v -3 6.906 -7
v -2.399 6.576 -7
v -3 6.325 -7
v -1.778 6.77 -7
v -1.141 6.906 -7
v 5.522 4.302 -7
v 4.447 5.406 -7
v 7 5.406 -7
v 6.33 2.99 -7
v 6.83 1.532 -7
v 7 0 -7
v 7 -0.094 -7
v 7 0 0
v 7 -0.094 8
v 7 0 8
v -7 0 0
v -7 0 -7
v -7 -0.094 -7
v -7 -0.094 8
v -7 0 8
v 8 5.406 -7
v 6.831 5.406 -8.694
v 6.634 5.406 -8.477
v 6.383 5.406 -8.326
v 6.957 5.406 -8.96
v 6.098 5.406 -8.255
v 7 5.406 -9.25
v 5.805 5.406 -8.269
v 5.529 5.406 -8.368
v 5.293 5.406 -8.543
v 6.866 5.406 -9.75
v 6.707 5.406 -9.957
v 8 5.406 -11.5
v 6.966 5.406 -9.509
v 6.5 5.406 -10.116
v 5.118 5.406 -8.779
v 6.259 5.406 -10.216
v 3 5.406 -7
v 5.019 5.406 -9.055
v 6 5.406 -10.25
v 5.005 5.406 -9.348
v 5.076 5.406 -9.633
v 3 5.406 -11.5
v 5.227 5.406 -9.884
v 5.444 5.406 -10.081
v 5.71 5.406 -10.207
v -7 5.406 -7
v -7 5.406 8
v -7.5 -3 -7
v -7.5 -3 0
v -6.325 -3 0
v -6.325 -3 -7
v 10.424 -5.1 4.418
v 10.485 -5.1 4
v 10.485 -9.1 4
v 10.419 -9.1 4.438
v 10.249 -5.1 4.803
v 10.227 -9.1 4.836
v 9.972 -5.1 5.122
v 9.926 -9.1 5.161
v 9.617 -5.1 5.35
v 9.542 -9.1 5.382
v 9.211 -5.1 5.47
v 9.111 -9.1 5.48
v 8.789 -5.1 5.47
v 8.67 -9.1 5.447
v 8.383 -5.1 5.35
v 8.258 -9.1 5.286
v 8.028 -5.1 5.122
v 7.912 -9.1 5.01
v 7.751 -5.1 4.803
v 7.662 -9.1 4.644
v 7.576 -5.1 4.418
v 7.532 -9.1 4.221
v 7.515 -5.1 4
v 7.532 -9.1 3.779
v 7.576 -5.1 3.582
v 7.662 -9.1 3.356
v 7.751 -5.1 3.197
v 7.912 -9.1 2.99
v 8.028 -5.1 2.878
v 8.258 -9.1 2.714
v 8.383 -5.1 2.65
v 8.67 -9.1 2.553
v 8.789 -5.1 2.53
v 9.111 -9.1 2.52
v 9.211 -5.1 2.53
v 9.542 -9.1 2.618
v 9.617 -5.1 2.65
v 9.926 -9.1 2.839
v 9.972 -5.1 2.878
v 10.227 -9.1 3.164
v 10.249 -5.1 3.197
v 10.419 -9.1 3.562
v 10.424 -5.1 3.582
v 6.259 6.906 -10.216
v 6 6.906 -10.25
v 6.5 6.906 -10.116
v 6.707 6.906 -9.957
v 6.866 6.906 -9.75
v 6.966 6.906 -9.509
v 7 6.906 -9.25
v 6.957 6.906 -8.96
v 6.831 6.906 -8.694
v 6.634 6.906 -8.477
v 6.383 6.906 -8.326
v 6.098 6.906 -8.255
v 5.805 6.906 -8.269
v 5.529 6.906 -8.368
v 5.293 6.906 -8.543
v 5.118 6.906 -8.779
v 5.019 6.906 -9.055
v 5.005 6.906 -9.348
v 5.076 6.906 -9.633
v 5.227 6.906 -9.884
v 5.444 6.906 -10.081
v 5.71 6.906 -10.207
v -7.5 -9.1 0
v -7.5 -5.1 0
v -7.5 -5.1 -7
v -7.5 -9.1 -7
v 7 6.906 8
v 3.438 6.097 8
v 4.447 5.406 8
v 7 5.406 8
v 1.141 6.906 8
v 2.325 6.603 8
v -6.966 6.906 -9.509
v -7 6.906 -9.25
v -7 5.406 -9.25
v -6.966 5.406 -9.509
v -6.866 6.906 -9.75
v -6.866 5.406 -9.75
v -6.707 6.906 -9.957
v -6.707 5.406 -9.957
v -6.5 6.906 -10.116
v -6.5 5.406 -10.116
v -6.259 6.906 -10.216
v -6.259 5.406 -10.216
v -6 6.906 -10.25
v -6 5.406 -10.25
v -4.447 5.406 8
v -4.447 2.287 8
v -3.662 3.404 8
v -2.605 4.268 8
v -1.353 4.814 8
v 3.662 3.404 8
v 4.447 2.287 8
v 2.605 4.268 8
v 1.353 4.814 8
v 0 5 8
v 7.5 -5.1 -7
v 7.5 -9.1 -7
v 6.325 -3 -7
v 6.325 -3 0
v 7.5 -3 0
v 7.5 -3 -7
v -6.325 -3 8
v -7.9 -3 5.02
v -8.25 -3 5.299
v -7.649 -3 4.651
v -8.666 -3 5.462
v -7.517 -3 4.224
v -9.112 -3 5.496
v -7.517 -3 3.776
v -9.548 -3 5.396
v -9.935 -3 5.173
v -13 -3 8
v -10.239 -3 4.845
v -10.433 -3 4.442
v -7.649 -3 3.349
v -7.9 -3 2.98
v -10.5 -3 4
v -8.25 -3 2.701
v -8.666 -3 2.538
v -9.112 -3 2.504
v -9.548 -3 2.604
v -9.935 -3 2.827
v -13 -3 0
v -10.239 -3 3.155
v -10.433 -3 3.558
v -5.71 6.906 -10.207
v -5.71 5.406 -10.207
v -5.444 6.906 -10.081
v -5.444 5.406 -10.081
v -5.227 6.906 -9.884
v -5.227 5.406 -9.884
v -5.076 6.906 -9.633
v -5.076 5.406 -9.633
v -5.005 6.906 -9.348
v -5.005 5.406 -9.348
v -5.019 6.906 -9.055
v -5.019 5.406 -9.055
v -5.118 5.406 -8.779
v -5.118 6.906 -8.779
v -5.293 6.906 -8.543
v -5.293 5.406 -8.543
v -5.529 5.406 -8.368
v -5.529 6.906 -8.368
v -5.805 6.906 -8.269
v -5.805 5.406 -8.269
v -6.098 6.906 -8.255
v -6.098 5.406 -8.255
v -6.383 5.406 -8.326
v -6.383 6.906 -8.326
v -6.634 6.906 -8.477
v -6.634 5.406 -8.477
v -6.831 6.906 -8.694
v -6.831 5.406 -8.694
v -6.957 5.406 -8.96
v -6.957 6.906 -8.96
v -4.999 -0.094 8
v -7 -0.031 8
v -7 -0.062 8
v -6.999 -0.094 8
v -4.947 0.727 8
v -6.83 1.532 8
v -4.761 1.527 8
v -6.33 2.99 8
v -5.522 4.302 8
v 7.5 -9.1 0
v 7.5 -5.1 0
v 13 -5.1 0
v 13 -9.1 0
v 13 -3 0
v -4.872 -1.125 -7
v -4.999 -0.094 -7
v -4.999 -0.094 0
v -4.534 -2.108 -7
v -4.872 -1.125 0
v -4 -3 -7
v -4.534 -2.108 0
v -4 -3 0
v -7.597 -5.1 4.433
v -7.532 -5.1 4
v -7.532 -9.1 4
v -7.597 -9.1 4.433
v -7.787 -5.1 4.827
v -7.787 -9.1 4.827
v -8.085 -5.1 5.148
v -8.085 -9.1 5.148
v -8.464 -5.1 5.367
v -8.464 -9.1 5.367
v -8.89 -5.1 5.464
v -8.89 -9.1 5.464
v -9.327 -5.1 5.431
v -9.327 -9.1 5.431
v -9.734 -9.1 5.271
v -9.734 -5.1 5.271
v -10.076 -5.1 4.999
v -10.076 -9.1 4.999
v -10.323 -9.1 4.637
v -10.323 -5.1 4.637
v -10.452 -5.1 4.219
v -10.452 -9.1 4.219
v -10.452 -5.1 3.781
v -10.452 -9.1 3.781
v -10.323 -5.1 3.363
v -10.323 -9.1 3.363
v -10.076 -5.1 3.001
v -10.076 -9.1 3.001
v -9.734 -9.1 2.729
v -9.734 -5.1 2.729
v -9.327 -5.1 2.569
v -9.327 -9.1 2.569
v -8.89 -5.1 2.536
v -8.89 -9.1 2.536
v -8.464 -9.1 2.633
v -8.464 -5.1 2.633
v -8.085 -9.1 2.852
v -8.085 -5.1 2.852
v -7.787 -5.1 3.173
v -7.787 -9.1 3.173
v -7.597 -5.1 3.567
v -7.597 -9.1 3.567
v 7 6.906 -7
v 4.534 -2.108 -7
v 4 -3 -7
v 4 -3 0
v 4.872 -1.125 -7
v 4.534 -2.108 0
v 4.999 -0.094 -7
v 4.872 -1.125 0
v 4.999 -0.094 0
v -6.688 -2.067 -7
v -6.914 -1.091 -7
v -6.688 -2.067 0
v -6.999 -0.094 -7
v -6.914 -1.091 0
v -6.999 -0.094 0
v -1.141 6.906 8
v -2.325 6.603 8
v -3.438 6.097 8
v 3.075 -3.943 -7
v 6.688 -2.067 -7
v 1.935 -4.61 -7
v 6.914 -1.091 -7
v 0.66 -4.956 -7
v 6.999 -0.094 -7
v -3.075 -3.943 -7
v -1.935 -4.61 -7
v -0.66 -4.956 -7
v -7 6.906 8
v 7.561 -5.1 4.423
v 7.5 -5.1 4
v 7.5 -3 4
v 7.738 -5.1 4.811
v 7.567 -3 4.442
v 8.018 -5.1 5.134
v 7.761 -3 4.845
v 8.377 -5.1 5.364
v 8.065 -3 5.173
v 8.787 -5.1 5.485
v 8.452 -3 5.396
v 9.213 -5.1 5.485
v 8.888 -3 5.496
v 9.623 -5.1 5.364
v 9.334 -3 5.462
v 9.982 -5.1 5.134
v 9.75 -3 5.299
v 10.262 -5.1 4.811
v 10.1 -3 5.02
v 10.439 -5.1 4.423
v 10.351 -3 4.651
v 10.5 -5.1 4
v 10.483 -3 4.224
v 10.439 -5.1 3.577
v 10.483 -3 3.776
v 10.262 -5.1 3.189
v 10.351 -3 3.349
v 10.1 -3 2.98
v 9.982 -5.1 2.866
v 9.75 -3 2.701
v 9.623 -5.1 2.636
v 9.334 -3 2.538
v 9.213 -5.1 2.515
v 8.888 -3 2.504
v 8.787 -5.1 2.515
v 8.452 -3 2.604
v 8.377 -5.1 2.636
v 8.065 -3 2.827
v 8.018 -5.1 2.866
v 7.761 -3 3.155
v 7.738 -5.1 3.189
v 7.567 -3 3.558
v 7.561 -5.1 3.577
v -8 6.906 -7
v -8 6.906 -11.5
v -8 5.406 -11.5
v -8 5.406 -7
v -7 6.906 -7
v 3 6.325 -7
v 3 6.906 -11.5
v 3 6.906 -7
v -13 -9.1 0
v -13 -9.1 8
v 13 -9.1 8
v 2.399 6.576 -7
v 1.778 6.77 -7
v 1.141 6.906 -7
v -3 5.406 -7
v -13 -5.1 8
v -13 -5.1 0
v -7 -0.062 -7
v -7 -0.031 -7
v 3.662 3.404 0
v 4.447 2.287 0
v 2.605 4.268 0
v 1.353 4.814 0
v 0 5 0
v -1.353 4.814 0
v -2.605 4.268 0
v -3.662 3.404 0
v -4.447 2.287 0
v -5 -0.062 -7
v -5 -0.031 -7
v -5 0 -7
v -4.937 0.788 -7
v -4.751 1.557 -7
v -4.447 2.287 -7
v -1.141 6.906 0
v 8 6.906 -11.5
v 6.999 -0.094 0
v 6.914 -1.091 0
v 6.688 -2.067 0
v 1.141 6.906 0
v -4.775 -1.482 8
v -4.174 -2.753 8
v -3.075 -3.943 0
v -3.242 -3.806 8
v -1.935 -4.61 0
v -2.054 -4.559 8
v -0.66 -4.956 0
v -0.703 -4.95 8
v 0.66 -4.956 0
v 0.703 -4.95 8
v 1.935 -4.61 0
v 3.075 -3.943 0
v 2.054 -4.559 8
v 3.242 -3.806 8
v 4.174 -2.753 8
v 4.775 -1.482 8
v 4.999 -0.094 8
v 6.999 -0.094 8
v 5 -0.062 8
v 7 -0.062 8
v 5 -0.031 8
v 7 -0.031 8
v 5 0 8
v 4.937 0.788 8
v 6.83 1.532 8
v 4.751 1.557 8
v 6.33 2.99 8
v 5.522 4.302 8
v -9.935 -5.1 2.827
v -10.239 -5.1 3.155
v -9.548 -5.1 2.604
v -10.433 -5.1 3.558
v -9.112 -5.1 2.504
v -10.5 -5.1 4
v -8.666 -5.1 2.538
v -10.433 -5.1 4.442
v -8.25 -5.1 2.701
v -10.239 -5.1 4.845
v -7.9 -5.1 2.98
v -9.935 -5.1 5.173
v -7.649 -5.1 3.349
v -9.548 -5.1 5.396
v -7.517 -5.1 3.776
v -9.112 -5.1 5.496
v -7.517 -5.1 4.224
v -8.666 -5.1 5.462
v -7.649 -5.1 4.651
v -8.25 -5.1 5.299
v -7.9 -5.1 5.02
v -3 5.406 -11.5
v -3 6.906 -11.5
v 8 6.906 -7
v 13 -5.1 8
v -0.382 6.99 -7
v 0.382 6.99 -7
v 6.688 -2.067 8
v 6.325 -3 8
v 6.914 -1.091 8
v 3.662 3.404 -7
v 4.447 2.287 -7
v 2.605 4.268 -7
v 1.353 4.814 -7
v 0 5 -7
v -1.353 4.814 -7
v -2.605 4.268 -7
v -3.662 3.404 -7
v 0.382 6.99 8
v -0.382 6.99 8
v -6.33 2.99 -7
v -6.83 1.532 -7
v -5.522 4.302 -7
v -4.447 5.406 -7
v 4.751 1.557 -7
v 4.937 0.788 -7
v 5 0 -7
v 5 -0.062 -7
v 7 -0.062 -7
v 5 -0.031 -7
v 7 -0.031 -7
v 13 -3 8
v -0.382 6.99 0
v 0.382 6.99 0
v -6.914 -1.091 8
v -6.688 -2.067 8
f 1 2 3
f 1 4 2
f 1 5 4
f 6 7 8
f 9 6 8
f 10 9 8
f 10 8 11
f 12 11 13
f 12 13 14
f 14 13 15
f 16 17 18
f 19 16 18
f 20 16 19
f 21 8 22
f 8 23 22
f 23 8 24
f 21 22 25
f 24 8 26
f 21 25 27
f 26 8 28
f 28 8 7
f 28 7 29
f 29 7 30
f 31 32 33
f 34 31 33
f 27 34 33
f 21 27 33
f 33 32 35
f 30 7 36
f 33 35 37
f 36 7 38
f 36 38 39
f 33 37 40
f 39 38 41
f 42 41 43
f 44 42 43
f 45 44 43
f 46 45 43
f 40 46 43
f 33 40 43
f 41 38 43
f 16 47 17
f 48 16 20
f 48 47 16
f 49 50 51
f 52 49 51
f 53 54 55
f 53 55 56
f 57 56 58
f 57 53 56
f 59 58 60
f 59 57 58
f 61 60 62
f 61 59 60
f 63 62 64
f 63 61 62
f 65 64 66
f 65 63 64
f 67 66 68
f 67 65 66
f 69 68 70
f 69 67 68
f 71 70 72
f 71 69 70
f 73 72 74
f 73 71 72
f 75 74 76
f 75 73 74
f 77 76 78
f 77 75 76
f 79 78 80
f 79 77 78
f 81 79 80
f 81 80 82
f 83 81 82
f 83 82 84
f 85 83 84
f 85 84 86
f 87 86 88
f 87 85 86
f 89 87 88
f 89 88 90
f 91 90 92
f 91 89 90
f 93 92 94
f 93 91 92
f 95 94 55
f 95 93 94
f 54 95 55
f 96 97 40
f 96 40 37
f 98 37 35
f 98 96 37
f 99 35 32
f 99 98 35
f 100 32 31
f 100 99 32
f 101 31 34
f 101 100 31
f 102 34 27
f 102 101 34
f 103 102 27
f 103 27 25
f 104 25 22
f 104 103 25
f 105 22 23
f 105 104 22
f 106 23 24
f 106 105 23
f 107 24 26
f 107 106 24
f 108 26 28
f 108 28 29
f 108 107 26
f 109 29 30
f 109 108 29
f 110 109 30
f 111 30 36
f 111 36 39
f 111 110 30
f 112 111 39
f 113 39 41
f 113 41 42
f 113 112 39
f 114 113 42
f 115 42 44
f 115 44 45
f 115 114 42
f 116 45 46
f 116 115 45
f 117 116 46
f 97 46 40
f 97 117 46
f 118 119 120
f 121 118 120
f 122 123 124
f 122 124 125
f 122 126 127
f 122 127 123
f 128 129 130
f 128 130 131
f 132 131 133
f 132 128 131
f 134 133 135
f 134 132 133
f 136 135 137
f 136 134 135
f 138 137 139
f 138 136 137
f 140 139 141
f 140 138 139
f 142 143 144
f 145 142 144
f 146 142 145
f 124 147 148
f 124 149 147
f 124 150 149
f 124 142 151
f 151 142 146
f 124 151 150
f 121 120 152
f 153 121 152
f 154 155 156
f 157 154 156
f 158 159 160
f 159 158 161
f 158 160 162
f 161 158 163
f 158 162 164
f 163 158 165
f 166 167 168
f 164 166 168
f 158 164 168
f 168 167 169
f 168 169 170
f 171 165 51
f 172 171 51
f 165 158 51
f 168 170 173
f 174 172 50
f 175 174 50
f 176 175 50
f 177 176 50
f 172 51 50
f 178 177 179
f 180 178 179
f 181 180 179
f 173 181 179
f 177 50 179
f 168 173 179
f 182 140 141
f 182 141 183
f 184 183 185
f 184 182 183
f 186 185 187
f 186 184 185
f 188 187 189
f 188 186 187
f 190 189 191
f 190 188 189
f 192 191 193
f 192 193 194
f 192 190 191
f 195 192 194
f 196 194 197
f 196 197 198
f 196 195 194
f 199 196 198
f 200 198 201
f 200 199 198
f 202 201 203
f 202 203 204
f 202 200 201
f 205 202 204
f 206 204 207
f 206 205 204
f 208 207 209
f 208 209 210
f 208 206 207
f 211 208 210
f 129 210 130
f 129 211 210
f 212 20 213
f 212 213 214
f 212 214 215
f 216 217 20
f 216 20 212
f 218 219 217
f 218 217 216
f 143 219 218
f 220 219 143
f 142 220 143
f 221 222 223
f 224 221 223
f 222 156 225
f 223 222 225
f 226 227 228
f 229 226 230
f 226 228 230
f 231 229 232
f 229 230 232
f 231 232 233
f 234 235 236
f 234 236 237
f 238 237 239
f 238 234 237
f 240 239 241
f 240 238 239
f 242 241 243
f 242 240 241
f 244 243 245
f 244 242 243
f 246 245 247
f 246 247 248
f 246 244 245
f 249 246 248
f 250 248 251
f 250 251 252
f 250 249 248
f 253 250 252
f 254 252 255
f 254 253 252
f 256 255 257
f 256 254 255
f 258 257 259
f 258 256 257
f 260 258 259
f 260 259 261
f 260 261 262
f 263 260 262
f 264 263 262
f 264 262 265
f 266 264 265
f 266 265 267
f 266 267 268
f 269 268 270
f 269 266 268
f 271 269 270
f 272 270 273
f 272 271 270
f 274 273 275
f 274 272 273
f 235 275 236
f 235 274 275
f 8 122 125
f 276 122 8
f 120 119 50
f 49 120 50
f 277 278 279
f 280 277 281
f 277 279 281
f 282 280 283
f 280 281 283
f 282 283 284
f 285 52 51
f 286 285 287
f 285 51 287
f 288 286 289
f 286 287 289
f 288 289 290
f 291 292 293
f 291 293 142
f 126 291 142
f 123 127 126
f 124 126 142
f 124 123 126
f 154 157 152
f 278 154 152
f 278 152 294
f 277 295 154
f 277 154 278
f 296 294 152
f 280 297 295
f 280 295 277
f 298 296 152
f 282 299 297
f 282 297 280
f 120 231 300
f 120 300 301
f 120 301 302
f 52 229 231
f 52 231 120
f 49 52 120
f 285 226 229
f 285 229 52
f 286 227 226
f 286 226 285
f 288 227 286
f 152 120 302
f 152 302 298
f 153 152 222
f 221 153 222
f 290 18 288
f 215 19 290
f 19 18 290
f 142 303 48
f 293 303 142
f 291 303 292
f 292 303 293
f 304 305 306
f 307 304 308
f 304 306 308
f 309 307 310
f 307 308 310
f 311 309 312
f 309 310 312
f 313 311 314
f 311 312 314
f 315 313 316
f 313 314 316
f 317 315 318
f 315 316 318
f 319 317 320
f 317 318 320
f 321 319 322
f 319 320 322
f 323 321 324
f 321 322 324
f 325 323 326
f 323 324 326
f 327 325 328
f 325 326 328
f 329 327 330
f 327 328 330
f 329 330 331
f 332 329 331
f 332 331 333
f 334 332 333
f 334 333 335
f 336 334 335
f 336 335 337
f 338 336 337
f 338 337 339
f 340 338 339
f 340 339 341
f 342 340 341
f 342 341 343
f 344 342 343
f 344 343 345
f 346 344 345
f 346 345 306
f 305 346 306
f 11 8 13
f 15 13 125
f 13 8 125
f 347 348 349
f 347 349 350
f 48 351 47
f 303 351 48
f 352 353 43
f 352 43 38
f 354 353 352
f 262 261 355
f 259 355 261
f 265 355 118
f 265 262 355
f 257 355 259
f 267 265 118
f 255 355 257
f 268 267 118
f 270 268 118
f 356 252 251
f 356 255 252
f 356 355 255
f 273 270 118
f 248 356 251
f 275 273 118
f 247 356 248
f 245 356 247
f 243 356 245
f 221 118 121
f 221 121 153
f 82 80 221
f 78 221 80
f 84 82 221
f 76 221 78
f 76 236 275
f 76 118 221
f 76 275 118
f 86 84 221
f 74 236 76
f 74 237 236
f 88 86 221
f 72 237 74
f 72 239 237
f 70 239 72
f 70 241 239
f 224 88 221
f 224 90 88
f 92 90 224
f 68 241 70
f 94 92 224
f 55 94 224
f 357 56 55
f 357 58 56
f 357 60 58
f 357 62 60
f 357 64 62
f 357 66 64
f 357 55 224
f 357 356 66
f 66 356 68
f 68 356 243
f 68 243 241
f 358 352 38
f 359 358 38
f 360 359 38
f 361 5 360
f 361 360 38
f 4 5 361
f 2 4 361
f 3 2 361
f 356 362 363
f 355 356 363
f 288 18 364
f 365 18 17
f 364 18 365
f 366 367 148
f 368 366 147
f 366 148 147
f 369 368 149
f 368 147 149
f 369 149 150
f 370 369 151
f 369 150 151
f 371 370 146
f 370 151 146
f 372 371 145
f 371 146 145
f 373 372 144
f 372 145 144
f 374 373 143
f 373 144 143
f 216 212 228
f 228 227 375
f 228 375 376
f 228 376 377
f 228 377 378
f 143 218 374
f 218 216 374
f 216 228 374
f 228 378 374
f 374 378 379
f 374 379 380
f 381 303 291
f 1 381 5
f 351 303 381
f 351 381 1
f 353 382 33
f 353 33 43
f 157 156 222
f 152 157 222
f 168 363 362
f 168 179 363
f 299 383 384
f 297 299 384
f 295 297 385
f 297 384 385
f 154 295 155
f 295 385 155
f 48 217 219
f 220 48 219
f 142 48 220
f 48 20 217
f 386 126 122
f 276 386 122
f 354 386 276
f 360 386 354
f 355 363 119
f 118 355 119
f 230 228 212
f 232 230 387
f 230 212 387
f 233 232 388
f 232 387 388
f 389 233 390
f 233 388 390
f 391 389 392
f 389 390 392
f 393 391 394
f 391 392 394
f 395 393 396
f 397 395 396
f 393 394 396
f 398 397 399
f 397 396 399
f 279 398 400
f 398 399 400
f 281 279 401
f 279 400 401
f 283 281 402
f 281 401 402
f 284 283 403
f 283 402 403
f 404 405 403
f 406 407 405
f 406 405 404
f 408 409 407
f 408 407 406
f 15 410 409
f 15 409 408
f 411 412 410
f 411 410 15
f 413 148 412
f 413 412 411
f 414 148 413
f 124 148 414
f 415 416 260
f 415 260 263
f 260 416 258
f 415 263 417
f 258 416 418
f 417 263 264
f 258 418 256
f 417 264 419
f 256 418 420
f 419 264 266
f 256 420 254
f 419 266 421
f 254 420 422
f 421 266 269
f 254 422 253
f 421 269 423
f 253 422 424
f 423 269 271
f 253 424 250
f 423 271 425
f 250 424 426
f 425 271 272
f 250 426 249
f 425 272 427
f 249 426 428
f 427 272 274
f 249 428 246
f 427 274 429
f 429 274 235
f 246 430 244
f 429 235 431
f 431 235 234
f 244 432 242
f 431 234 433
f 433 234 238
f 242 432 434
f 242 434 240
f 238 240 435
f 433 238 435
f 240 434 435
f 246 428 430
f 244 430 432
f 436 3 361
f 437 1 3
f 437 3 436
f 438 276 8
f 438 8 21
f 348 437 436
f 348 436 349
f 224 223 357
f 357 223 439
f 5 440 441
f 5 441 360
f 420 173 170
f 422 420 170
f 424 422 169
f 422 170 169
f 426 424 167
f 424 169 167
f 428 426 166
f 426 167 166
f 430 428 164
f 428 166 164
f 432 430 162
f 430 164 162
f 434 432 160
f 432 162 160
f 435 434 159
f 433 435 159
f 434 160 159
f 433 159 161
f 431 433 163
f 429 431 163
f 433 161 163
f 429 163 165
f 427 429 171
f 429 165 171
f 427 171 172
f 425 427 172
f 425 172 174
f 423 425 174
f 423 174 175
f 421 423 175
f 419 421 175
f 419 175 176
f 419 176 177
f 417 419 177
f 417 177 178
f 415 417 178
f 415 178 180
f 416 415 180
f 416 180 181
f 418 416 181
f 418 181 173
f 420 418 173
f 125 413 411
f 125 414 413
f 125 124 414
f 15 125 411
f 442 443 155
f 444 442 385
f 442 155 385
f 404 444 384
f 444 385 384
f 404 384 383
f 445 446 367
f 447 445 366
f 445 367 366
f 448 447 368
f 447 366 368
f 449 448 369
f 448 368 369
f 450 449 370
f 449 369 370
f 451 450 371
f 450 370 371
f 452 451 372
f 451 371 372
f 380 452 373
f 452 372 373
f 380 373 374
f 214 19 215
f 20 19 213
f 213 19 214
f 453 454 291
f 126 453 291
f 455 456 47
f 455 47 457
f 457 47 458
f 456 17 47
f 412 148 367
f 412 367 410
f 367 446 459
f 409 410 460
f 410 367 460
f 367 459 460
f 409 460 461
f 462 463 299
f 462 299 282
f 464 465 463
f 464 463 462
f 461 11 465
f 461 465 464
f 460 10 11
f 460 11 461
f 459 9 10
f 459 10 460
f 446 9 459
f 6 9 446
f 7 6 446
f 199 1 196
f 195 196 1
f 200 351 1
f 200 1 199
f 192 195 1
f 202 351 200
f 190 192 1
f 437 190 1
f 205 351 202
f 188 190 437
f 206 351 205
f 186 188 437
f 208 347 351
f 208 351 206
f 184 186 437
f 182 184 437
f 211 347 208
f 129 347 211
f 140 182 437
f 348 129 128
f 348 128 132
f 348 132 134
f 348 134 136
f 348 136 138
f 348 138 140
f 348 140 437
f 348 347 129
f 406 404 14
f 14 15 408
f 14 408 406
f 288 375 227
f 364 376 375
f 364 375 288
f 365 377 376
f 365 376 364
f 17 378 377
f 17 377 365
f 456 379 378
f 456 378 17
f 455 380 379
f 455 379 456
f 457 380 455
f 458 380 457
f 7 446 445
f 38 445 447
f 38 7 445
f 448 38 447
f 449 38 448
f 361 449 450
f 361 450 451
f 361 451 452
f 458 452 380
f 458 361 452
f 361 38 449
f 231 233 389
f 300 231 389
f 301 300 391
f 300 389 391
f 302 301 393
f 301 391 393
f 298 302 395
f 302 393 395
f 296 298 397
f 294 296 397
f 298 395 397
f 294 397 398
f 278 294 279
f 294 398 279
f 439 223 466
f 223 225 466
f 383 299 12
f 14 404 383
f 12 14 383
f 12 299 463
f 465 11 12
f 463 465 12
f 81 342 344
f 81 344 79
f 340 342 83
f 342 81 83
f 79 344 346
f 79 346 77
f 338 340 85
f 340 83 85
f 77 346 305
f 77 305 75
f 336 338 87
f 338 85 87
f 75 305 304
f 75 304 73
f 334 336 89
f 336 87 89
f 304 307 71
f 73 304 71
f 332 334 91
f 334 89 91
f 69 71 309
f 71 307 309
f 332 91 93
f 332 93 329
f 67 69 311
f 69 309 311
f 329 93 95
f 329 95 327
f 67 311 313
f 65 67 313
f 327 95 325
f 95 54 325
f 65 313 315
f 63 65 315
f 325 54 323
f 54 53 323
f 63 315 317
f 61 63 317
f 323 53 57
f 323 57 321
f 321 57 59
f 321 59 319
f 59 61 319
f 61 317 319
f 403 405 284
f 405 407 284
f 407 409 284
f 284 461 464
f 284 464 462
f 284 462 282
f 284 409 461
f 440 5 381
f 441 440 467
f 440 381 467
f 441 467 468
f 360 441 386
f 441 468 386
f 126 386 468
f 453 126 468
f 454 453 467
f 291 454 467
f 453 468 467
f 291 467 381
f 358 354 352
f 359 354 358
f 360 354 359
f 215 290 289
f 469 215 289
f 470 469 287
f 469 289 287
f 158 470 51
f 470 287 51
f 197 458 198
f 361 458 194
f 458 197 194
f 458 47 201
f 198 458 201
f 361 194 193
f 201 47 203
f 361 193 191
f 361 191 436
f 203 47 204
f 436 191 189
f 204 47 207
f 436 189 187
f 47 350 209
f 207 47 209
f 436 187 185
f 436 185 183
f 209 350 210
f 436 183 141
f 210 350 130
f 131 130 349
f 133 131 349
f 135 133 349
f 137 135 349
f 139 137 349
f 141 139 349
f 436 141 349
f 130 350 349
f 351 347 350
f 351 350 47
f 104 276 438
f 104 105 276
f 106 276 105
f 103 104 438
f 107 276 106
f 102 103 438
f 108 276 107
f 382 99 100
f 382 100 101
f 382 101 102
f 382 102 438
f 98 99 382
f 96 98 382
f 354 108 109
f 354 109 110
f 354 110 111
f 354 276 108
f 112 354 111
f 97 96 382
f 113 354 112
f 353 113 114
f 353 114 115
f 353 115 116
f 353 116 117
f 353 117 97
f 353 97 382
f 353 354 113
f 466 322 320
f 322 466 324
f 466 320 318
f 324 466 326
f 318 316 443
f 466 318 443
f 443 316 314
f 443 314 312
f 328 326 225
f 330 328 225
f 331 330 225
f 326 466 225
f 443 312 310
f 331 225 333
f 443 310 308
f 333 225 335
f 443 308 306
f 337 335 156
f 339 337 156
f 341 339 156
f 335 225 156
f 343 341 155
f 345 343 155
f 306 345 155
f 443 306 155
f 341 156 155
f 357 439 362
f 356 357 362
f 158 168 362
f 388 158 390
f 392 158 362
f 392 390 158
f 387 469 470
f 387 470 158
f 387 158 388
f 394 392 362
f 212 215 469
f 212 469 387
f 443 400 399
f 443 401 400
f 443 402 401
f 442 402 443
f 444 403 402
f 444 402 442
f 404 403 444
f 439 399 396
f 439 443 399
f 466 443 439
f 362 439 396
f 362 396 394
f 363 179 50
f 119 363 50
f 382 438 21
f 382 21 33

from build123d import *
from build123d.topology import SkipClean

# Parameters (mm, degrees)
RESSALTO_EXTRUS_O4_DEPTH  = 8
ESBO_O7_W                 = 26
ESBO_O7_H                 = 8
RESSALTO_EXTRUS_O5_DEPTH  = 0.1
ESBO_O8_R                 = 5
CORTE_EXTRUS_O7_DEPTH     = 17.792855624
RESSALTO_EXTRUS_O6_DEPTH  = 7
ESBO_O10_R                = 1.5
CORTE_EXTRUS_O8_DEPTH     = 19.248287591
RESSALTO_EXTRUS_O7_DEPTH  = 1.5
ESBO_O12_W                = 2.553491136
ESBO_O12_H                = 15
RESSALTO_EXTRUS_O9_DEPTH  = 5.5
ESBO_O13_R                = 5
CORTE_EXTRUS_O9_DEPTH     = 22.04756518
ESBO_O14_R                = 1.468193857
ESBO_O14_R_2              = 1.484614178
RESSALTO_EXTRUS_O10_DEPTH = 4


with BuildPart() as part:
    # Esboço4 → Ressalto-extrusão4 (new body)
    with BuildSketch(Plane.XY):
        with BuildLine():
            Line((-13, -5), (13, -5))
            Line((13, -5), (13, -3))
            Line((13, -3), (6.32455532, -3))
            ThreePointArc((6.32455532, -3), (0, 7), (-6.32455532, -3))
            Line((-6.32455532, -3), (-13, -3))
            Line((-13, -3), (-13, -5))
        make_face()
    extrude(amount=RESSALTO_EXTRUS_O4_DEPTH)

    # Esboço7 → Ressalto-extrusão5 (add)
    with BuildSketch(Plane.XZ.offset(5)):
        with Locations((0, 4)):
            Rectangle(ESBO_O7_W, ESBO_O7_H)
    extrude(amount=RESSALTO_EXTRUS_O5_DEPTH)

    # Esboço8 → Corte-extrusão7 (cut, through all)
    with BuildSketch(Plane.XY.offset(8)):
        Circle(ESBO_O8_R)
    extrude(amount=-CORTE_EXTRUS_O7_DEPTH, mode=Mode.SUBTRACT)

    # Esboço9 → Ressalto-extrusão6 (add)
    with SkipClean():  # the faces are left unmerged after this step: merging them gives an invalid solid
        with BuildSketch(Plane(origin=(0, 0, 0), x_dir=(-1, 0, 0), z_dir=(0, 0, -1))):
            with BuildLine():
                Line((-6.32455532, -3), (-7.5, -3))
                Line((-7.5, -3), (-7.5, -5.1))
                Line((-7.5, -5.1), (0, -5.1))
                Line((0, -5.1), (7.5, -5.1))
                Line((7.5, -5.1), (7.5, -3))
                Line((7.5, -3), (6.32455532, -3))
                ThreePointArc((6.32455532, -3), (0, 7), (-6.32455532, -3))
            make_face()
            with BuildLine():
                ThreePointArc((5, 0), (4.74341649, -1.58113883), (4, -3))
                ThreePointArc((4, -3), (0, -5), (-4, -3))
                ThreePointArc((-4, -3), (-1.58113883, 4.74341649), (5, 0))
            make_face(mode=Mode.SUBTRACT)
        extrude(amount=RESSALTO_EXTRUS_O6_DEPTH)

    # Esboço10 → Corte-extrusão8 (cut, through all)
    with SkipClean():  # the faces are left unmerged after this step: merging them gives an invalid solid
        with BuildSketch(Plane(origin=(0, -3, 0), x_dir=(1, 0, 0), z_dir=(0, 1, 0))):
            with Locations(Location((-9, -4, 0), (0, 0, 180))):
                Circle(ESBO_O10_R)
            with Locations(Location((9, -4, 0), (0, 0, 180))):
                Circle(ESBO_O10_R)
        extrude(amount=-CORTE_EXTRUS_O8_DEPTH, mode=Mode.SUBTRACT)

    # Esboço11 → Ressalto-extrusão7 (add)
    # profile 1 of 3: a face of its own
    with SkipClean():  # the faces are left unmerged after this step: merging them gives an invalid solid
        with BuildSketch(Plane(origin=(0, 6.906344322, 0), x_dir=(0, 0, -1), z_dir=(0, 1, 0))):
            Polygon((7, 3), (7, 7), (-8, 7), (-8, -7), (7, -7), (7, -3), align=None)
        # profile 2 of 3: a face of its own
        with BuildSketch(Plane(origin=(0, 6.906344322, 0), x_dir=(0, 0, -1), z_dir=(0, 1, 0))):
            Polygon((7, 8), (7, 7), (7, 3), (11.5, 3), (11.5, 7), (11.5, 8), (9.25, 8), align=None)
            with BuildLine():
                ThreePointArc((10.25, 6), (8.542893219, 5.292893219), (9.25, 7))
                ThreePointArc((9.25, 7), (9.957106781, 6.707106781), (10.25, 6))
            make_face(mode=Mode.SUBTRACT)
        # profile 3 of 3: a face of its own
        with BuildSketch(Plane(origin=(0, 6.906344322, 0), x_dir=(0, 0, -1), z_dir=(0, 1, 0))):
            Polygon((11.5, -3), (7, -3), (7, -7), (7, -8), (9.25, -8), (11.5, -8), (11.5, -7), align=None)
            with BuildLine():
                ThreePointArc((10.25, -6), (9.957106781, -6.707106781), (9.25, -7))
                ThreePointArc((9.25, -7), (8.542893219, -5.292893219), (10.25, -6))
            make_face(mode=Mode.SUBTRACT)
        extrude(amount=-RESSALTO_EXTRUS_O7_DEPTH)

    # Esboço12 → Ressalto-extrusão9 (add)
    with SkipClean():  # the faces are left unmerged after this step: merging them gives an invalid solid
        with BuildSketch(Plane.XZ.offset(-5.406344322)):
            with Locations((-5.723254432, 0.5)):
                Rectangle(ESBO_O12_W, ESBO_O12_H)
            with Locations((5.723254432, 0.5)):
                Rectangle(ESBO_O12_W, ESBO_O12_H)
        extrude(amount=RESSALTO_EXTRUS_O9_DEPTH)

    # Esboço13 → Corte-extrusão9 (cut, through all)
    with SkipClean():  # the faces are left unmerged after this step: merging them gives an invalid solid
        with BuildSketch(Plane(origin=(0, 0, -7), x_dir=(-1, 0, 0), z_dir=(0, 0, -1))):
            with Locations(Location((0, 0, 0), (0, 0, 180))):
                Circle(ESBO_O13_R)
        extrude(amount=-CORTE_EXTRUS_O9_DEPTH, mode=Mode.SUBTRACT)

    # Esboço14 → Ressalto-extrusão10 (add)
    with SkipClean():  # the faces are left unmerged after this step: merging them gives an invalid solid
        with BuildSketch(Plane.XZ.offset(5.1)):
            Polygon((-13, 8), (-13, 0), (-7.5, 0), (-7.5, -7), (7.5, -7), (7.5, 0), (13, 0), (13, 8), align=None)
            with Locations((-9, 4)):
                Circle(ESBO_O14_R, mode=Mode.SUBTRACT)
            with Locations((9, 4)):
                Circle(ESBO_O14_R_2, mode=Mode.SUBTRACT)
        extrude(amount=RESSALTO_EXTRUS_O10_DEPTH)


solid = part.part
